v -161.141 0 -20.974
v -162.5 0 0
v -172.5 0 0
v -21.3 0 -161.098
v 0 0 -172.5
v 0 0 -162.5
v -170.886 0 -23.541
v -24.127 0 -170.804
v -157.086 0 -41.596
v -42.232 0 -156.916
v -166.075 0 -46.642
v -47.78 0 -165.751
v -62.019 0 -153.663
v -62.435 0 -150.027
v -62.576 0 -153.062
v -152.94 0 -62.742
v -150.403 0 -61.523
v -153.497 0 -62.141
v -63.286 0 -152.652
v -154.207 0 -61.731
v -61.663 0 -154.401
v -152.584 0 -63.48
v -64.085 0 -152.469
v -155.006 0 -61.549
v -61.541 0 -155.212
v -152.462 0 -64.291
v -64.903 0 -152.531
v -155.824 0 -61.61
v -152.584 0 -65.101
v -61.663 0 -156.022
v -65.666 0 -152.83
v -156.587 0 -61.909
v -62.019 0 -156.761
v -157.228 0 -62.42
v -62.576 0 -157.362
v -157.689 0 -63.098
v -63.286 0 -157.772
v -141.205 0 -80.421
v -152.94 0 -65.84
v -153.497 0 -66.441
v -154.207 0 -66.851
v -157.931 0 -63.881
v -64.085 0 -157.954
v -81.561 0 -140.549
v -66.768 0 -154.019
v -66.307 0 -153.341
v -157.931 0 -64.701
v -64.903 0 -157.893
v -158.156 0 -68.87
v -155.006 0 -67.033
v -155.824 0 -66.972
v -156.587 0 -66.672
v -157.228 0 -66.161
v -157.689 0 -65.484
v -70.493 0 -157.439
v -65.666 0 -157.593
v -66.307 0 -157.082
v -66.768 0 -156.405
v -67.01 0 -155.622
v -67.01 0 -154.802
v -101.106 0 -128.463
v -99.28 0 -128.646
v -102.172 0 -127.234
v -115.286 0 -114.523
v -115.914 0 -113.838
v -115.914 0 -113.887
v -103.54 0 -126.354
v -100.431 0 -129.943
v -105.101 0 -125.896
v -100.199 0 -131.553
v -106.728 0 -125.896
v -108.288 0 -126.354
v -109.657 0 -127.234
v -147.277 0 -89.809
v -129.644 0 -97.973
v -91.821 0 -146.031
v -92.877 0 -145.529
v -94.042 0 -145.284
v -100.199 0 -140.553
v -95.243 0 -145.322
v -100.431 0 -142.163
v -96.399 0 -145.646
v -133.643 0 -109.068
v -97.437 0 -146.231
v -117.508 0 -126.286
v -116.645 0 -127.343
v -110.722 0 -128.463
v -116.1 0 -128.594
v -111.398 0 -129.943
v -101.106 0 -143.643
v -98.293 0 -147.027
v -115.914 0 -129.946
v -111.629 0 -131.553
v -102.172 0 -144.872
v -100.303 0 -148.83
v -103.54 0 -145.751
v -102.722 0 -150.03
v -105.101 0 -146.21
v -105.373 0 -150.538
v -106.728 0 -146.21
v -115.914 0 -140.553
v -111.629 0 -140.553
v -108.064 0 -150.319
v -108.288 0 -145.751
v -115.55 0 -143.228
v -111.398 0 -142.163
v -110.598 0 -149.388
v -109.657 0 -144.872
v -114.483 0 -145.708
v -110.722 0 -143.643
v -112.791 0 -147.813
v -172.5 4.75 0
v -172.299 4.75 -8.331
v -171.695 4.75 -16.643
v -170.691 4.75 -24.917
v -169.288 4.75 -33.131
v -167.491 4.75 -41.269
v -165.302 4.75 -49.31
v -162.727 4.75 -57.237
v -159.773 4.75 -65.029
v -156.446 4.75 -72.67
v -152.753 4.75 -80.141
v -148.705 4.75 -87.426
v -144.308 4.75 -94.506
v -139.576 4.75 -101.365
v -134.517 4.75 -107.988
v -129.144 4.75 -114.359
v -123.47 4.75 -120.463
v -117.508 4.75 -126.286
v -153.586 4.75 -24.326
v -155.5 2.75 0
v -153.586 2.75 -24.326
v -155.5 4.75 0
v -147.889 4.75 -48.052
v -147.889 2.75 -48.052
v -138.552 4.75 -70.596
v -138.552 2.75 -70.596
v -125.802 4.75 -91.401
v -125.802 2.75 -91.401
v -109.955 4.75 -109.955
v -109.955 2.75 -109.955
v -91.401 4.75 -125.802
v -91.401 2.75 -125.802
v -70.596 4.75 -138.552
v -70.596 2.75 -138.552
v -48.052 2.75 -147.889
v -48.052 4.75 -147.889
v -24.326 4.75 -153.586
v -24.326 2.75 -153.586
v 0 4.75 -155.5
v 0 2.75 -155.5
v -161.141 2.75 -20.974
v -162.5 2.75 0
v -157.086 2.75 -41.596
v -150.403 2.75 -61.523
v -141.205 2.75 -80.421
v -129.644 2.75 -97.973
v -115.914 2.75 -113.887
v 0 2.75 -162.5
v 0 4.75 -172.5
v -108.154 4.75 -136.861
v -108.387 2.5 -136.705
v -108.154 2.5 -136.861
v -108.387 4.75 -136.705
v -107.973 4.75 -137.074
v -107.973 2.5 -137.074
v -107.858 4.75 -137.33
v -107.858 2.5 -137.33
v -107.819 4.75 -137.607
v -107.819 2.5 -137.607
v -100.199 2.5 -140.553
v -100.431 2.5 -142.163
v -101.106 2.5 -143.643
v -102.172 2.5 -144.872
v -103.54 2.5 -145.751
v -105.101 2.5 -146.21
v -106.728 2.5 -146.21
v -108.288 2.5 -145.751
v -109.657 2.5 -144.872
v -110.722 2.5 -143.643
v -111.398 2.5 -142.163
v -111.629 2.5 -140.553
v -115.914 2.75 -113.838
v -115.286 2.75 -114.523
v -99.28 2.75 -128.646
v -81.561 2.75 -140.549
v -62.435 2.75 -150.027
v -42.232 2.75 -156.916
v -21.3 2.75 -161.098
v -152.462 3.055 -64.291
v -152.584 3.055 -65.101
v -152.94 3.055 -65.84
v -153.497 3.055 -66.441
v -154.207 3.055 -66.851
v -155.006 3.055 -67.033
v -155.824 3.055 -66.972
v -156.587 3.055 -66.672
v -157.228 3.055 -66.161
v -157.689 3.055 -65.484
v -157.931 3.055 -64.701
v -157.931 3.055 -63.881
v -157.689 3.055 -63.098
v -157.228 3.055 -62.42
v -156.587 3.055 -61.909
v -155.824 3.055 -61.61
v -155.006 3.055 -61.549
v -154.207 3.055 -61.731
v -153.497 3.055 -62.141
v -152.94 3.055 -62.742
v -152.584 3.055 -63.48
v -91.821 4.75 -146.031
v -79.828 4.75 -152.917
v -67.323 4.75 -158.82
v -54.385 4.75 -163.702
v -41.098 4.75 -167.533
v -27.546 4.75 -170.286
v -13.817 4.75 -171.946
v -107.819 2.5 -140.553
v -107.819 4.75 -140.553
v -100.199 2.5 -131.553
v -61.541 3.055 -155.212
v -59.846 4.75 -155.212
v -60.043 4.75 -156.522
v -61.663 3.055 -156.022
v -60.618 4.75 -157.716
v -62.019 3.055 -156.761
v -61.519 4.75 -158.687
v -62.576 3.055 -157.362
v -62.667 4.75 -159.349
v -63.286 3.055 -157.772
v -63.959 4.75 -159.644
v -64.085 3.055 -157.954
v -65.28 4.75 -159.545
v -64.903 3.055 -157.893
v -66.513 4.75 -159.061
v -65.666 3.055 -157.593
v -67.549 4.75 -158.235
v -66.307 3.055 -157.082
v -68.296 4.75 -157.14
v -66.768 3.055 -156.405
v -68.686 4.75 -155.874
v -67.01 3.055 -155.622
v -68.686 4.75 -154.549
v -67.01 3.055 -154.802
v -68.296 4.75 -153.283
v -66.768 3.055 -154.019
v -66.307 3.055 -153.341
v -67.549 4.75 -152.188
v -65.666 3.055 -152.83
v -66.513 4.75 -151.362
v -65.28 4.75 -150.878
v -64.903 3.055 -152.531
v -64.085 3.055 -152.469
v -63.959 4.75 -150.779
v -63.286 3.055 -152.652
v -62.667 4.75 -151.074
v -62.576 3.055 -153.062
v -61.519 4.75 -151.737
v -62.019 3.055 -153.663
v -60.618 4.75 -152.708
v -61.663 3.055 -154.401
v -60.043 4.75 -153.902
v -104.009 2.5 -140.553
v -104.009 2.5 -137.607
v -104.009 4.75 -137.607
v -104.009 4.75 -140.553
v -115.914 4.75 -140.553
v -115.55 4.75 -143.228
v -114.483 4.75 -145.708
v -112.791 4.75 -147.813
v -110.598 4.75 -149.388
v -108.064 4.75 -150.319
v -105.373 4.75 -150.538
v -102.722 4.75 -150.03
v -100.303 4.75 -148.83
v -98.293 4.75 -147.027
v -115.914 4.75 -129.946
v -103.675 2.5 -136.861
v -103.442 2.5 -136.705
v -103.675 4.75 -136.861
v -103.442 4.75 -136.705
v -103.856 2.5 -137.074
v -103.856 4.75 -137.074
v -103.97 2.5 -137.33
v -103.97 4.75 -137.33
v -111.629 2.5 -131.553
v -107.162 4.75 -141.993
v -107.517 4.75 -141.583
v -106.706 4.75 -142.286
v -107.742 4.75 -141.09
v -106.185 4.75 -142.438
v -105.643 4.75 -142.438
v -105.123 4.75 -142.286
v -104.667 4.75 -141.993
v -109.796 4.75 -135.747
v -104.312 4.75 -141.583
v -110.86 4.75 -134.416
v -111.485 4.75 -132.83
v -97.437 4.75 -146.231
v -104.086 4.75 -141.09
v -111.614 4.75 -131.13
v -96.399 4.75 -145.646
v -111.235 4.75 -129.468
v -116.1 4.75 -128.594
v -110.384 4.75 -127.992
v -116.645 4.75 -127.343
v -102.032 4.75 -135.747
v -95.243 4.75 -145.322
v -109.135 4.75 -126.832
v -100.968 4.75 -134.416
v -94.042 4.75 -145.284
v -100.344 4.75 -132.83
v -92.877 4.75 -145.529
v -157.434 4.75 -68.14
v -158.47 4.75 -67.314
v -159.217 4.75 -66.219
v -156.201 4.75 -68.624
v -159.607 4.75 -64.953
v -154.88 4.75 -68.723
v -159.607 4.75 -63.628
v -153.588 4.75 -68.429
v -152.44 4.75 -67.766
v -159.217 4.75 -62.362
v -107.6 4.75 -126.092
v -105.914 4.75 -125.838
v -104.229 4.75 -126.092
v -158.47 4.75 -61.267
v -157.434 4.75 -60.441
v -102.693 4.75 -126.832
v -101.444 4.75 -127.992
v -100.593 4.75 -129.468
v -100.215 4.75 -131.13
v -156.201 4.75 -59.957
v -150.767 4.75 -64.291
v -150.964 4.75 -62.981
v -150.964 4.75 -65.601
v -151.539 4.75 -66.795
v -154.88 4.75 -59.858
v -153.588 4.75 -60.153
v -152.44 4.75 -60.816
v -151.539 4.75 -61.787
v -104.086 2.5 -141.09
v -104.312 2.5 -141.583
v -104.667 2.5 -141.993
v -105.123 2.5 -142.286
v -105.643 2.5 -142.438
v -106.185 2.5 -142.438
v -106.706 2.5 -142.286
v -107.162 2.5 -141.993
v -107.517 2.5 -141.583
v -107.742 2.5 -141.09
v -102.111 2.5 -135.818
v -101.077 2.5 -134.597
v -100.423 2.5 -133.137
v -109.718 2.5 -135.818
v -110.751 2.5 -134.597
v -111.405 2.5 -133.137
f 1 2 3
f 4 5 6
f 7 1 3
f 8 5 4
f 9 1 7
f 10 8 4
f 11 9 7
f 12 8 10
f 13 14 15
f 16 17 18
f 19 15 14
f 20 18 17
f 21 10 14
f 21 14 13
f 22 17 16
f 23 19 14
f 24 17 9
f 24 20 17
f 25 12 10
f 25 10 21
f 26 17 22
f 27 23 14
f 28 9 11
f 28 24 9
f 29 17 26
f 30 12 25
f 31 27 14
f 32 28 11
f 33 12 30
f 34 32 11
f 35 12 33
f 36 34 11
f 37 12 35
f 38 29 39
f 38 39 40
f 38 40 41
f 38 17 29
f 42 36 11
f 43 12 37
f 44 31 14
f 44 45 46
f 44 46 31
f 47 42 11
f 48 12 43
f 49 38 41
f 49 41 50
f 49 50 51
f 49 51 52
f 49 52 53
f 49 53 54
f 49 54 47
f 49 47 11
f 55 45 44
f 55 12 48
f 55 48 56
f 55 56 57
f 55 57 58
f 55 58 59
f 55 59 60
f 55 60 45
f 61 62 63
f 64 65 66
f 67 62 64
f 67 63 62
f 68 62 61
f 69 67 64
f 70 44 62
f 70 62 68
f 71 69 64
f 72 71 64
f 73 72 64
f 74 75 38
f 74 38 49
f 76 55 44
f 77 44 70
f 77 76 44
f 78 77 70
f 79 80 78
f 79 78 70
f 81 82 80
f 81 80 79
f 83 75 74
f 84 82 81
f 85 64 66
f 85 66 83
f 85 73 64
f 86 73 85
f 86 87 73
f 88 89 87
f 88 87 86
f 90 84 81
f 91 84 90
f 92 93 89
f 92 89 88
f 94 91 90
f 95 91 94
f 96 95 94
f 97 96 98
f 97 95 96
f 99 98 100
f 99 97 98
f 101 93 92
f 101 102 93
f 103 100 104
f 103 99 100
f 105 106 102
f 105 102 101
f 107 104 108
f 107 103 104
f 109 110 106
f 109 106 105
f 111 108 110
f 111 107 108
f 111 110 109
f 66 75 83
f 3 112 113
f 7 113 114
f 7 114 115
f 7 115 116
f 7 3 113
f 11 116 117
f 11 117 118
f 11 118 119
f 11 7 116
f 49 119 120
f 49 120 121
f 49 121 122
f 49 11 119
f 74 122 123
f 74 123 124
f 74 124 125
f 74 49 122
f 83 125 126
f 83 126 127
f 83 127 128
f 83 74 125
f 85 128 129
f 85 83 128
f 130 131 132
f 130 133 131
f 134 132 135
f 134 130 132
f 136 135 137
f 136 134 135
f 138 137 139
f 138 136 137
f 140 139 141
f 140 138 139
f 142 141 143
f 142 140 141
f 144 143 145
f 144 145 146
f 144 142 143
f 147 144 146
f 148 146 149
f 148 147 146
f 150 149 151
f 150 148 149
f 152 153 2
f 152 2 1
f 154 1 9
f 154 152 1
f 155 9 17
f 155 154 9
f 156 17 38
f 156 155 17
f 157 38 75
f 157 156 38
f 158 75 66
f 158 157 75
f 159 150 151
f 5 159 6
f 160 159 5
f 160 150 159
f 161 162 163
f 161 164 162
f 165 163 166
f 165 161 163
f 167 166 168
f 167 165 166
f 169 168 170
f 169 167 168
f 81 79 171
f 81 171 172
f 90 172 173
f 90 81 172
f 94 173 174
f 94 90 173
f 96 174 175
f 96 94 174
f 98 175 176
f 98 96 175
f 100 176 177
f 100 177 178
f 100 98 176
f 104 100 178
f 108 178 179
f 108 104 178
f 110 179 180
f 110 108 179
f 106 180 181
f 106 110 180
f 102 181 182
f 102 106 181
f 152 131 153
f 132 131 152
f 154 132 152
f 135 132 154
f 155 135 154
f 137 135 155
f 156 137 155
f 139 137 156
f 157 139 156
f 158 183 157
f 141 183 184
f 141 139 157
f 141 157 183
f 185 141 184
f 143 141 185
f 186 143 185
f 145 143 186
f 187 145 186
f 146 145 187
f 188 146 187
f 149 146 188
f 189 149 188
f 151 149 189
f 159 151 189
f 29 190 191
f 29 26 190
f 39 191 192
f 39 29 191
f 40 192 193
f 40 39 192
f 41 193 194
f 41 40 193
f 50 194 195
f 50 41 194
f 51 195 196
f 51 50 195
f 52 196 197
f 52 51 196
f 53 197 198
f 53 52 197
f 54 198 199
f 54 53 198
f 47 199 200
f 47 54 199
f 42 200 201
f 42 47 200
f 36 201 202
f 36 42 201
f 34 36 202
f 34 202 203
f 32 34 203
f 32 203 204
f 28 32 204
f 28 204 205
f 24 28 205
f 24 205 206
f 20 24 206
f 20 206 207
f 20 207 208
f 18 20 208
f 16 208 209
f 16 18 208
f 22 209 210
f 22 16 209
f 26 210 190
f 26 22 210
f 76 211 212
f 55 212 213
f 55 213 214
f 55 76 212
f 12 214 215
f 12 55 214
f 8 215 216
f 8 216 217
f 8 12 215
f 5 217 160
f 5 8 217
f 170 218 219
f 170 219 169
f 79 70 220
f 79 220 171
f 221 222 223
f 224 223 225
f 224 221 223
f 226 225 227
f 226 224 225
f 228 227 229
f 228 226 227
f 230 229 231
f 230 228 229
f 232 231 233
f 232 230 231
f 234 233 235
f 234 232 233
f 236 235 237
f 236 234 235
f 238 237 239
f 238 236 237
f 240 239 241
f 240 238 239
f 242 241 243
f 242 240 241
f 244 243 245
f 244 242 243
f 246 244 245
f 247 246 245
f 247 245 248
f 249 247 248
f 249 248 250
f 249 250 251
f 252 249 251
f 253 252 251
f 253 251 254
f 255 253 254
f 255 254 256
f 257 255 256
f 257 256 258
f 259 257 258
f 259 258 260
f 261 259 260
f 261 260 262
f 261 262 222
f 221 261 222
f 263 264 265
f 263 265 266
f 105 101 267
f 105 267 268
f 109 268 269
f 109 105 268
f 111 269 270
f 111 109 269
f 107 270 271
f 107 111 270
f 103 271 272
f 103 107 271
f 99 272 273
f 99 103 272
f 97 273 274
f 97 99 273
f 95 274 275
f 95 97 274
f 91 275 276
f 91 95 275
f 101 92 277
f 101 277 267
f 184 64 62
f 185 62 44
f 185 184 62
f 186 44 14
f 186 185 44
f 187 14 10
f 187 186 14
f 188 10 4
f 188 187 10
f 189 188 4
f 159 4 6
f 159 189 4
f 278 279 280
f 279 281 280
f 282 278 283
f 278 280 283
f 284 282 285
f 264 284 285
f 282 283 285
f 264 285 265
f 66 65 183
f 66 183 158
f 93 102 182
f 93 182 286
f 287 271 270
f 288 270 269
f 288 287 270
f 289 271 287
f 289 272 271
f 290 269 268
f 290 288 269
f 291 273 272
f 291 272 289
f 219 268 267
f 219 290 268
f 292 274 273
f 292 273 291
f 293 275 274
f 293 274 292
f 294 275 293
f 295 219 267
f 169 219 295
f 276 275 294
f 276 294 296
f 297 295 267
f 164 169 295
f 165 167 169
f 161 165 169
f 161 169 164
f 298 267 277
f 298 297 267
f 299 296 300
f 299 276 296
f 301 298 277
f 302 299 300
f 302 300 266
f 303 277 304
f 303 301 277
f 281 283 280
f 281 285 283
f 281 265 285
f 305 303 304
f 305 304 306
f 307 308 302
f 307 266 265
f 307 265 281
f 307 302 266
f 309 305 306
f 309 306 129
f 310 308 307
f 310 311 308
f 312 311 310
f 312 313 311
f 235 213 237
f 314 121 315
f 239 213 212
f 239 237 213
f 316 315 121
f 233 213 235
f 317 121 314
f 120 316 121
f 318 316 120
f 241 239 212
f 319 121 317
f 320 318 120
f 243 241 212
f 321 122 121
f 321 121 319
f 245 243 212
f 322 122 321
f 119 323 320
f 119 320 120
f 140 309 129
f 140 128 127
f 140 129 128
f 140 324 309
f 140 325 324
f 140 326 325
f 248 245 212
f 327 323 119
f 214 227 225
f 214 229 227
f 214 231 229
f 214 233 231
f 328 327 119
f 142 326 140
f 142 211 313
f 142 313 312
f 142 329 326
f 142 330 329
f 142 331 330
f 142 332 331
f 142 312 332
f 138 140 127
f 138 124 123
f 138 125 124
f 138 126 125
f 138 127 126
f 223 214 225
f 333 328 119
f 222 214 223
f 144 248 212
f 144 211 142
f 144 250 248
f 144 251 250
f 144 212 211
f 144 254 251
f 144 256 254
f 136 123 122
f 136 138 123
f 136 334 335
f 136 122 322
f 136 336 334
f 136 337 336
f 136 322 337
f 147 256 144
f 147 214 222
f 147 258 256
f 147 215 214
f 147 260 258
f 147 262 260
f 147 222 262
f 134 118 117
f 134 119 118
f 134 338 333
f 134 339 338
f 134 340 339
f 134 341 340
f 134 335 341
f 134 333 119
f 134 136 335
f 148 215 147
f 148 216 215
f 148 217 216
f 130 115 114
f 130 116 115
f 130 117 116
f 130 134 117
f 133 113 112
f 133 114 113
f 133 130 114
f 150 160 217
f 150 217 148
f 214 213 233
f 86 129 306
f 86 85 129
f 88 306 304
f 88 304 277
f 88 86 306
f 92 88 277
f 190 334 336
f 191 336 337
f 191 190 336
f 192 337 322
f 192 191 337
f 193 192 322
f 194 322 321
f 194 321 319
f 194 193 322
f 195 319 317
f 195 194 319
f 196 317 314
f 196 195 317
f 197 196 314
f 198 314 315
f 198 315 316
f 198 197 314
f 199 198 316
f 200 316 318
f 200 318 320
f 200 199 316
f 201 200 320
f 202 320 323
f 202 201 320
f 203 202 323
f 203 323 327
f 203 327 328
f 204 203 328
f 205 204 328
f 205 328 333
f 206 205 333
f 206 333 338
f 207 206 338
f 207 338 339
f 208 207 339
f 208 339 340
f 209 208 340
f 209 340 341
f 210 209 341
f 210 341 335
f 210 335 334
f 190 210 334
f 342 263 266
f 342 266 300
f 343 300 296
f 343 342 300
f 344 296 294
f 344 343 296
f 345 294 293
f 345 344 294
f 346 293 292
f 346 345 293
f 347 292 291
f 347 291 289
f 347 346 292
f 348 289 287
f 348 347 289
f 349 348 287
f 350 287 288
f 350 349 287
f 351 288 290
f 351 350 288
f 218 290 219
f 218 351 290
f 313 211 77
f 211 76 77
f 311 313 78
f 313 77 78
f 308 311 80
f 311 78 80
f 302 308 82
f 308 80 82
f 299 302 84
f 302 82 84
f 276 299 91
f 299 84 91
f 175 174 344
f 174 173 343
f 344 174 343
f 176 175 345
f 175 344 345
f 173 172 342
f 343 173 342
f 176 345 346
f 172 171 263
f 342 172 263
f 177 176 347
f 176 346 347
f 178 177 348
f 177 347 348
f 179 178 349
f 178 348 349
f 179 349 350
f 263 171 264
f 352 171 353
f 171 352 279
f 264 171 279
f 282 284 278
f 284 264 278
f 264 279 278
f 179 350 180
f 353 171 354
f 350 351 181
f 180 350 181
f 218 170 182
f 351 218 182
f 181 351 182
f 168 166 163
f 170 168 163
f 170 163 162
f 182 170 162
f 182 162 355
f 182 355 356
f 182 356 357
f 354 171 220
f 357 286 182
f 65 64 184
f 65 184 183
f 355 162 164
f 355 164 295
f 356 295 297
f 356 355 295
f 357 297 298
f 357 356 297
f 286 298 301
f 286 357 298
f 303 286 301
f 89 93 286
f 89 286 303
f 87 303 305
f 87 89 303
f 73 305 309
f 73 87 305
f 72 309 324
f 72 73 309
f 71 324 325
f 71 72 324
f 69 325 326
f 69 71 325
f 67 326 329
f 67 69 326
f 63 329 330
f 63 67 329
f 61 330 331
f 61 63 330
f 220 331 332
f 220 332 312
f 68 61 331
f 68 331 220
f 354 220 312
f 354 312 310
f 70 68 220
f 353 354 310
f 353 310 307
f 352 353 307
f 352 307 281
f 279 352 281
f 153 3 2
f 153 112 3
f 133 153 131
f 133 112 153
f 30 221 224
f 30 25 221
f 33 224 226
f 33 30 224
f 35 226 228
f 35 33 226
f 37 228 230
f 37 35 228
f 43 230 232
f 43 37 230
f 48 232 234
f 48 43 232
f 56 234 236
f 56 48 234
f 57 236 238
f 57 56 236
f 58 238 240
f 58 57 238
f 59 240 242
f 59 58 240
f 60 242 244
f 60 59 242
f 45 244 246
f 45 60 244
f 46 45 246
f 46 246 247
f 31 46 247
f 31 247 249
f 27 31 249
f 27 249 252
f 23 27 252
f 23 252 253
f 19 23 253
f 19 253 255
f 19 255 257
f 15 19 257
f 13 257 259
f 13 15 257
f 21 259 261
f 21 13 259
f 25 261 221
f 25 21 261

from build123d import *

# Parameters (mm, degrees)
CUT_EXTRUDE2_DEPTH                   = 25.4
F_6_0_204_DIAMETER_HOLE1_D           = 5.499999922
F_6_0_204_DIAMETER_HOLE1_CSINK_D     = 8.89
F_6_0_204_DIAMETER_HOLE1_CSINK_ANGLE = 90
BOSS_EXTRUDE2_REACH                  = 245.998
CUT_EXTRUDE3_DEPTH                   = 244.998078886
CUT_EXTRUDE4_DEPTH                   = 2.5
FILLET1_R                            = 5
FILLET3_R                            = 1


with BuildPart() as part:
    # Sketch1 → Revolve1 (revolve)
    with BuildSketch(Plane.XY, mode=Mode.PRIVATE) as revolve1_sk:
        Polygon((-162.5, 0), (-162.5, 2.75), (-155.5, 2.75), (-155.5, 4.75), (-172.5, 4.75), (-172.5, 0), align=None)
    revolve(revolve1_sk.sketch.rotate(Axis((0, 0, 0), (0, 1, 0)), 270), axis=Axis((0, 0, 0), (0, 1, 0)))

    # Sketch5 → Cut-Extrude2 (cut, symmetric)
    with BuildSketch(Plane(origin=(0, 0, 0), x_dir=(1, 0, 0), z_dir=(0, 1, 0))):
        with BuildLine():
            Line((0, 0), (0, 184.517203458))
            ThreePointArc((0, 184.517203458), (-130.473365811, -130.473365811), (184.517203458, 0))
            Line((184.517203458, 0), (0, 0))
        make_face()
    extrude(amount=CUT_EXTRUDE2_DEPTH, both=True, mode=Mode.SUBTRACT)

    # #6 (0.204) Diameter Hole1 (through all)
    with Locations(Plane(origin=(0, 4.75, 0), x_dir=(1, 0, 0), z_dir=(0, 1, 0))):
        with Locations((155.211761462, 64.290816637), (64.290816637, 155.211761462)):
            CounterSinkHole(F_6_0_204_DIAMETER_HOLE1_D / 2, F_6_0_204_DIAMETER_HOLE1_CSINK_D / 2, counter_sink_angle=F_6_0_204_DIAMETER_HOLE1_CSINK_ANGLE)

    # Boss-Extrude2: up to this face of the body (flat: up to its plane)
    boss_extrude2_end = Plane(part.part.faces().sort_by_distance((111.680104475, 4.75, -111.680104475))[0])
    # Sketch13 → Boss-Extrude2 (add, up to the picked face)
    with BuildSketch(Plane(origin=(0, 0, 0), x_dir=(1, 0, 0), z_dir=(0, 1, 0)), mode=Mode.PRIVATE) as boss_extrude2_sk1:
        with BuildLine():
            Line((115.914175626, 113.837772395), (115.914175626, 140.5528583))
            ThreePointArc((115.914175626, 140.5528583), (105.914175626, 150.5528583), (95.914175626, 140.5528583))
            Line((95.914175626, 140.5528583), (95.914175626, 135.636049675))
            Line((95.914175626, 135.636049675), (115.914175626, 113.837772395))
        make_face()
    boss_extrude2_tool1 = split(extrude(boss_extrude2_sk1.sketch, amount=BOSS_EXTRUDE2_REACH, mode=Mode.PRIVATE), bisect_by=boss_extrude2_end, keep=Keep.BOTH, mode=Mode.PRIVATE)
    add(boss_extrude2_tool1.solids().sort_by(Axis((107.449054, 0, -135.840664), (0, 1, 0)))[0])

    # Sketch8 → Cut-Extrude3 (cut, through all)
    with BuildSketch(Plane.XZ):
        with BuildLine():
            Line((104.009175626, -136.941011973), (104.009175626, -140.5528583))
            ThreePointArc((104.009175626, -140.5528583), (105.914175626, -142.4578583), (107.819175626, -140.5528583))
            Line((107.819175626, -140.5528583), (107.819175626, -136.941011973))
            ThreePointArc((107.819175626, -136.941011973), (105.914175626, -125.8378583), (104.009175626, -136.941011973))
        make_face()
    extrude(amount=-CUT_EXTRUDE3_DEPTH, mode=Mode.SUBTRACT)

    # Sketch9 → Cut-Extrude4 (cut)
    with BuildSketch(Plane.XZ):
        with BuildLine():
            Line((111.629175626, -140.5528583), (111.629175626, -131.5528583))
            ThreePointArc((111.629175626, -131.5528583), (105.914175626, -125.8378583), (100.199175626, -131.5528583))
            Line((100.199175626, -131.5528583), (100.199175626, -140.5528583))
            ThreePointArc((100.199175626, -140.5528583), (105.914175626, -146.2678583), (111.629175626, -140.5528583))
        make_face()
    extrude(amount=-CUT_EXTRUDE4_DEPTH, mode=Mode.SUBTRACT)

    # Fillet1
    fillet1_edges = [part.edges().sort_by_distance(p)[0] for p in [
        (115.914175626, 2.375, -127.750357687),
        (96.256410587, 2.375, -143.146615122),
    ]]
    fillet(fillet1_edges, radius=FILLET1_R)


with BuildPart() as body_2:
    # Mirror1: mirrored copy
    add(part.part.mirror(Plane(origin=(0, 0, 0), x_dir=(0, 0, 1), z_dir=(1, 0, 0))))

    # Fillet3
    fillet3_edges = [body_2.edges().sort_by_distance(p)[0] for p in [
        (-104.009175626, 3.625, -136.941011973),
        (-107.819175626, 3.625, -136.941011973),
    ]]
    fillet(fillet3_edges, radius=FILLET3_R)


solid = body_2.part
